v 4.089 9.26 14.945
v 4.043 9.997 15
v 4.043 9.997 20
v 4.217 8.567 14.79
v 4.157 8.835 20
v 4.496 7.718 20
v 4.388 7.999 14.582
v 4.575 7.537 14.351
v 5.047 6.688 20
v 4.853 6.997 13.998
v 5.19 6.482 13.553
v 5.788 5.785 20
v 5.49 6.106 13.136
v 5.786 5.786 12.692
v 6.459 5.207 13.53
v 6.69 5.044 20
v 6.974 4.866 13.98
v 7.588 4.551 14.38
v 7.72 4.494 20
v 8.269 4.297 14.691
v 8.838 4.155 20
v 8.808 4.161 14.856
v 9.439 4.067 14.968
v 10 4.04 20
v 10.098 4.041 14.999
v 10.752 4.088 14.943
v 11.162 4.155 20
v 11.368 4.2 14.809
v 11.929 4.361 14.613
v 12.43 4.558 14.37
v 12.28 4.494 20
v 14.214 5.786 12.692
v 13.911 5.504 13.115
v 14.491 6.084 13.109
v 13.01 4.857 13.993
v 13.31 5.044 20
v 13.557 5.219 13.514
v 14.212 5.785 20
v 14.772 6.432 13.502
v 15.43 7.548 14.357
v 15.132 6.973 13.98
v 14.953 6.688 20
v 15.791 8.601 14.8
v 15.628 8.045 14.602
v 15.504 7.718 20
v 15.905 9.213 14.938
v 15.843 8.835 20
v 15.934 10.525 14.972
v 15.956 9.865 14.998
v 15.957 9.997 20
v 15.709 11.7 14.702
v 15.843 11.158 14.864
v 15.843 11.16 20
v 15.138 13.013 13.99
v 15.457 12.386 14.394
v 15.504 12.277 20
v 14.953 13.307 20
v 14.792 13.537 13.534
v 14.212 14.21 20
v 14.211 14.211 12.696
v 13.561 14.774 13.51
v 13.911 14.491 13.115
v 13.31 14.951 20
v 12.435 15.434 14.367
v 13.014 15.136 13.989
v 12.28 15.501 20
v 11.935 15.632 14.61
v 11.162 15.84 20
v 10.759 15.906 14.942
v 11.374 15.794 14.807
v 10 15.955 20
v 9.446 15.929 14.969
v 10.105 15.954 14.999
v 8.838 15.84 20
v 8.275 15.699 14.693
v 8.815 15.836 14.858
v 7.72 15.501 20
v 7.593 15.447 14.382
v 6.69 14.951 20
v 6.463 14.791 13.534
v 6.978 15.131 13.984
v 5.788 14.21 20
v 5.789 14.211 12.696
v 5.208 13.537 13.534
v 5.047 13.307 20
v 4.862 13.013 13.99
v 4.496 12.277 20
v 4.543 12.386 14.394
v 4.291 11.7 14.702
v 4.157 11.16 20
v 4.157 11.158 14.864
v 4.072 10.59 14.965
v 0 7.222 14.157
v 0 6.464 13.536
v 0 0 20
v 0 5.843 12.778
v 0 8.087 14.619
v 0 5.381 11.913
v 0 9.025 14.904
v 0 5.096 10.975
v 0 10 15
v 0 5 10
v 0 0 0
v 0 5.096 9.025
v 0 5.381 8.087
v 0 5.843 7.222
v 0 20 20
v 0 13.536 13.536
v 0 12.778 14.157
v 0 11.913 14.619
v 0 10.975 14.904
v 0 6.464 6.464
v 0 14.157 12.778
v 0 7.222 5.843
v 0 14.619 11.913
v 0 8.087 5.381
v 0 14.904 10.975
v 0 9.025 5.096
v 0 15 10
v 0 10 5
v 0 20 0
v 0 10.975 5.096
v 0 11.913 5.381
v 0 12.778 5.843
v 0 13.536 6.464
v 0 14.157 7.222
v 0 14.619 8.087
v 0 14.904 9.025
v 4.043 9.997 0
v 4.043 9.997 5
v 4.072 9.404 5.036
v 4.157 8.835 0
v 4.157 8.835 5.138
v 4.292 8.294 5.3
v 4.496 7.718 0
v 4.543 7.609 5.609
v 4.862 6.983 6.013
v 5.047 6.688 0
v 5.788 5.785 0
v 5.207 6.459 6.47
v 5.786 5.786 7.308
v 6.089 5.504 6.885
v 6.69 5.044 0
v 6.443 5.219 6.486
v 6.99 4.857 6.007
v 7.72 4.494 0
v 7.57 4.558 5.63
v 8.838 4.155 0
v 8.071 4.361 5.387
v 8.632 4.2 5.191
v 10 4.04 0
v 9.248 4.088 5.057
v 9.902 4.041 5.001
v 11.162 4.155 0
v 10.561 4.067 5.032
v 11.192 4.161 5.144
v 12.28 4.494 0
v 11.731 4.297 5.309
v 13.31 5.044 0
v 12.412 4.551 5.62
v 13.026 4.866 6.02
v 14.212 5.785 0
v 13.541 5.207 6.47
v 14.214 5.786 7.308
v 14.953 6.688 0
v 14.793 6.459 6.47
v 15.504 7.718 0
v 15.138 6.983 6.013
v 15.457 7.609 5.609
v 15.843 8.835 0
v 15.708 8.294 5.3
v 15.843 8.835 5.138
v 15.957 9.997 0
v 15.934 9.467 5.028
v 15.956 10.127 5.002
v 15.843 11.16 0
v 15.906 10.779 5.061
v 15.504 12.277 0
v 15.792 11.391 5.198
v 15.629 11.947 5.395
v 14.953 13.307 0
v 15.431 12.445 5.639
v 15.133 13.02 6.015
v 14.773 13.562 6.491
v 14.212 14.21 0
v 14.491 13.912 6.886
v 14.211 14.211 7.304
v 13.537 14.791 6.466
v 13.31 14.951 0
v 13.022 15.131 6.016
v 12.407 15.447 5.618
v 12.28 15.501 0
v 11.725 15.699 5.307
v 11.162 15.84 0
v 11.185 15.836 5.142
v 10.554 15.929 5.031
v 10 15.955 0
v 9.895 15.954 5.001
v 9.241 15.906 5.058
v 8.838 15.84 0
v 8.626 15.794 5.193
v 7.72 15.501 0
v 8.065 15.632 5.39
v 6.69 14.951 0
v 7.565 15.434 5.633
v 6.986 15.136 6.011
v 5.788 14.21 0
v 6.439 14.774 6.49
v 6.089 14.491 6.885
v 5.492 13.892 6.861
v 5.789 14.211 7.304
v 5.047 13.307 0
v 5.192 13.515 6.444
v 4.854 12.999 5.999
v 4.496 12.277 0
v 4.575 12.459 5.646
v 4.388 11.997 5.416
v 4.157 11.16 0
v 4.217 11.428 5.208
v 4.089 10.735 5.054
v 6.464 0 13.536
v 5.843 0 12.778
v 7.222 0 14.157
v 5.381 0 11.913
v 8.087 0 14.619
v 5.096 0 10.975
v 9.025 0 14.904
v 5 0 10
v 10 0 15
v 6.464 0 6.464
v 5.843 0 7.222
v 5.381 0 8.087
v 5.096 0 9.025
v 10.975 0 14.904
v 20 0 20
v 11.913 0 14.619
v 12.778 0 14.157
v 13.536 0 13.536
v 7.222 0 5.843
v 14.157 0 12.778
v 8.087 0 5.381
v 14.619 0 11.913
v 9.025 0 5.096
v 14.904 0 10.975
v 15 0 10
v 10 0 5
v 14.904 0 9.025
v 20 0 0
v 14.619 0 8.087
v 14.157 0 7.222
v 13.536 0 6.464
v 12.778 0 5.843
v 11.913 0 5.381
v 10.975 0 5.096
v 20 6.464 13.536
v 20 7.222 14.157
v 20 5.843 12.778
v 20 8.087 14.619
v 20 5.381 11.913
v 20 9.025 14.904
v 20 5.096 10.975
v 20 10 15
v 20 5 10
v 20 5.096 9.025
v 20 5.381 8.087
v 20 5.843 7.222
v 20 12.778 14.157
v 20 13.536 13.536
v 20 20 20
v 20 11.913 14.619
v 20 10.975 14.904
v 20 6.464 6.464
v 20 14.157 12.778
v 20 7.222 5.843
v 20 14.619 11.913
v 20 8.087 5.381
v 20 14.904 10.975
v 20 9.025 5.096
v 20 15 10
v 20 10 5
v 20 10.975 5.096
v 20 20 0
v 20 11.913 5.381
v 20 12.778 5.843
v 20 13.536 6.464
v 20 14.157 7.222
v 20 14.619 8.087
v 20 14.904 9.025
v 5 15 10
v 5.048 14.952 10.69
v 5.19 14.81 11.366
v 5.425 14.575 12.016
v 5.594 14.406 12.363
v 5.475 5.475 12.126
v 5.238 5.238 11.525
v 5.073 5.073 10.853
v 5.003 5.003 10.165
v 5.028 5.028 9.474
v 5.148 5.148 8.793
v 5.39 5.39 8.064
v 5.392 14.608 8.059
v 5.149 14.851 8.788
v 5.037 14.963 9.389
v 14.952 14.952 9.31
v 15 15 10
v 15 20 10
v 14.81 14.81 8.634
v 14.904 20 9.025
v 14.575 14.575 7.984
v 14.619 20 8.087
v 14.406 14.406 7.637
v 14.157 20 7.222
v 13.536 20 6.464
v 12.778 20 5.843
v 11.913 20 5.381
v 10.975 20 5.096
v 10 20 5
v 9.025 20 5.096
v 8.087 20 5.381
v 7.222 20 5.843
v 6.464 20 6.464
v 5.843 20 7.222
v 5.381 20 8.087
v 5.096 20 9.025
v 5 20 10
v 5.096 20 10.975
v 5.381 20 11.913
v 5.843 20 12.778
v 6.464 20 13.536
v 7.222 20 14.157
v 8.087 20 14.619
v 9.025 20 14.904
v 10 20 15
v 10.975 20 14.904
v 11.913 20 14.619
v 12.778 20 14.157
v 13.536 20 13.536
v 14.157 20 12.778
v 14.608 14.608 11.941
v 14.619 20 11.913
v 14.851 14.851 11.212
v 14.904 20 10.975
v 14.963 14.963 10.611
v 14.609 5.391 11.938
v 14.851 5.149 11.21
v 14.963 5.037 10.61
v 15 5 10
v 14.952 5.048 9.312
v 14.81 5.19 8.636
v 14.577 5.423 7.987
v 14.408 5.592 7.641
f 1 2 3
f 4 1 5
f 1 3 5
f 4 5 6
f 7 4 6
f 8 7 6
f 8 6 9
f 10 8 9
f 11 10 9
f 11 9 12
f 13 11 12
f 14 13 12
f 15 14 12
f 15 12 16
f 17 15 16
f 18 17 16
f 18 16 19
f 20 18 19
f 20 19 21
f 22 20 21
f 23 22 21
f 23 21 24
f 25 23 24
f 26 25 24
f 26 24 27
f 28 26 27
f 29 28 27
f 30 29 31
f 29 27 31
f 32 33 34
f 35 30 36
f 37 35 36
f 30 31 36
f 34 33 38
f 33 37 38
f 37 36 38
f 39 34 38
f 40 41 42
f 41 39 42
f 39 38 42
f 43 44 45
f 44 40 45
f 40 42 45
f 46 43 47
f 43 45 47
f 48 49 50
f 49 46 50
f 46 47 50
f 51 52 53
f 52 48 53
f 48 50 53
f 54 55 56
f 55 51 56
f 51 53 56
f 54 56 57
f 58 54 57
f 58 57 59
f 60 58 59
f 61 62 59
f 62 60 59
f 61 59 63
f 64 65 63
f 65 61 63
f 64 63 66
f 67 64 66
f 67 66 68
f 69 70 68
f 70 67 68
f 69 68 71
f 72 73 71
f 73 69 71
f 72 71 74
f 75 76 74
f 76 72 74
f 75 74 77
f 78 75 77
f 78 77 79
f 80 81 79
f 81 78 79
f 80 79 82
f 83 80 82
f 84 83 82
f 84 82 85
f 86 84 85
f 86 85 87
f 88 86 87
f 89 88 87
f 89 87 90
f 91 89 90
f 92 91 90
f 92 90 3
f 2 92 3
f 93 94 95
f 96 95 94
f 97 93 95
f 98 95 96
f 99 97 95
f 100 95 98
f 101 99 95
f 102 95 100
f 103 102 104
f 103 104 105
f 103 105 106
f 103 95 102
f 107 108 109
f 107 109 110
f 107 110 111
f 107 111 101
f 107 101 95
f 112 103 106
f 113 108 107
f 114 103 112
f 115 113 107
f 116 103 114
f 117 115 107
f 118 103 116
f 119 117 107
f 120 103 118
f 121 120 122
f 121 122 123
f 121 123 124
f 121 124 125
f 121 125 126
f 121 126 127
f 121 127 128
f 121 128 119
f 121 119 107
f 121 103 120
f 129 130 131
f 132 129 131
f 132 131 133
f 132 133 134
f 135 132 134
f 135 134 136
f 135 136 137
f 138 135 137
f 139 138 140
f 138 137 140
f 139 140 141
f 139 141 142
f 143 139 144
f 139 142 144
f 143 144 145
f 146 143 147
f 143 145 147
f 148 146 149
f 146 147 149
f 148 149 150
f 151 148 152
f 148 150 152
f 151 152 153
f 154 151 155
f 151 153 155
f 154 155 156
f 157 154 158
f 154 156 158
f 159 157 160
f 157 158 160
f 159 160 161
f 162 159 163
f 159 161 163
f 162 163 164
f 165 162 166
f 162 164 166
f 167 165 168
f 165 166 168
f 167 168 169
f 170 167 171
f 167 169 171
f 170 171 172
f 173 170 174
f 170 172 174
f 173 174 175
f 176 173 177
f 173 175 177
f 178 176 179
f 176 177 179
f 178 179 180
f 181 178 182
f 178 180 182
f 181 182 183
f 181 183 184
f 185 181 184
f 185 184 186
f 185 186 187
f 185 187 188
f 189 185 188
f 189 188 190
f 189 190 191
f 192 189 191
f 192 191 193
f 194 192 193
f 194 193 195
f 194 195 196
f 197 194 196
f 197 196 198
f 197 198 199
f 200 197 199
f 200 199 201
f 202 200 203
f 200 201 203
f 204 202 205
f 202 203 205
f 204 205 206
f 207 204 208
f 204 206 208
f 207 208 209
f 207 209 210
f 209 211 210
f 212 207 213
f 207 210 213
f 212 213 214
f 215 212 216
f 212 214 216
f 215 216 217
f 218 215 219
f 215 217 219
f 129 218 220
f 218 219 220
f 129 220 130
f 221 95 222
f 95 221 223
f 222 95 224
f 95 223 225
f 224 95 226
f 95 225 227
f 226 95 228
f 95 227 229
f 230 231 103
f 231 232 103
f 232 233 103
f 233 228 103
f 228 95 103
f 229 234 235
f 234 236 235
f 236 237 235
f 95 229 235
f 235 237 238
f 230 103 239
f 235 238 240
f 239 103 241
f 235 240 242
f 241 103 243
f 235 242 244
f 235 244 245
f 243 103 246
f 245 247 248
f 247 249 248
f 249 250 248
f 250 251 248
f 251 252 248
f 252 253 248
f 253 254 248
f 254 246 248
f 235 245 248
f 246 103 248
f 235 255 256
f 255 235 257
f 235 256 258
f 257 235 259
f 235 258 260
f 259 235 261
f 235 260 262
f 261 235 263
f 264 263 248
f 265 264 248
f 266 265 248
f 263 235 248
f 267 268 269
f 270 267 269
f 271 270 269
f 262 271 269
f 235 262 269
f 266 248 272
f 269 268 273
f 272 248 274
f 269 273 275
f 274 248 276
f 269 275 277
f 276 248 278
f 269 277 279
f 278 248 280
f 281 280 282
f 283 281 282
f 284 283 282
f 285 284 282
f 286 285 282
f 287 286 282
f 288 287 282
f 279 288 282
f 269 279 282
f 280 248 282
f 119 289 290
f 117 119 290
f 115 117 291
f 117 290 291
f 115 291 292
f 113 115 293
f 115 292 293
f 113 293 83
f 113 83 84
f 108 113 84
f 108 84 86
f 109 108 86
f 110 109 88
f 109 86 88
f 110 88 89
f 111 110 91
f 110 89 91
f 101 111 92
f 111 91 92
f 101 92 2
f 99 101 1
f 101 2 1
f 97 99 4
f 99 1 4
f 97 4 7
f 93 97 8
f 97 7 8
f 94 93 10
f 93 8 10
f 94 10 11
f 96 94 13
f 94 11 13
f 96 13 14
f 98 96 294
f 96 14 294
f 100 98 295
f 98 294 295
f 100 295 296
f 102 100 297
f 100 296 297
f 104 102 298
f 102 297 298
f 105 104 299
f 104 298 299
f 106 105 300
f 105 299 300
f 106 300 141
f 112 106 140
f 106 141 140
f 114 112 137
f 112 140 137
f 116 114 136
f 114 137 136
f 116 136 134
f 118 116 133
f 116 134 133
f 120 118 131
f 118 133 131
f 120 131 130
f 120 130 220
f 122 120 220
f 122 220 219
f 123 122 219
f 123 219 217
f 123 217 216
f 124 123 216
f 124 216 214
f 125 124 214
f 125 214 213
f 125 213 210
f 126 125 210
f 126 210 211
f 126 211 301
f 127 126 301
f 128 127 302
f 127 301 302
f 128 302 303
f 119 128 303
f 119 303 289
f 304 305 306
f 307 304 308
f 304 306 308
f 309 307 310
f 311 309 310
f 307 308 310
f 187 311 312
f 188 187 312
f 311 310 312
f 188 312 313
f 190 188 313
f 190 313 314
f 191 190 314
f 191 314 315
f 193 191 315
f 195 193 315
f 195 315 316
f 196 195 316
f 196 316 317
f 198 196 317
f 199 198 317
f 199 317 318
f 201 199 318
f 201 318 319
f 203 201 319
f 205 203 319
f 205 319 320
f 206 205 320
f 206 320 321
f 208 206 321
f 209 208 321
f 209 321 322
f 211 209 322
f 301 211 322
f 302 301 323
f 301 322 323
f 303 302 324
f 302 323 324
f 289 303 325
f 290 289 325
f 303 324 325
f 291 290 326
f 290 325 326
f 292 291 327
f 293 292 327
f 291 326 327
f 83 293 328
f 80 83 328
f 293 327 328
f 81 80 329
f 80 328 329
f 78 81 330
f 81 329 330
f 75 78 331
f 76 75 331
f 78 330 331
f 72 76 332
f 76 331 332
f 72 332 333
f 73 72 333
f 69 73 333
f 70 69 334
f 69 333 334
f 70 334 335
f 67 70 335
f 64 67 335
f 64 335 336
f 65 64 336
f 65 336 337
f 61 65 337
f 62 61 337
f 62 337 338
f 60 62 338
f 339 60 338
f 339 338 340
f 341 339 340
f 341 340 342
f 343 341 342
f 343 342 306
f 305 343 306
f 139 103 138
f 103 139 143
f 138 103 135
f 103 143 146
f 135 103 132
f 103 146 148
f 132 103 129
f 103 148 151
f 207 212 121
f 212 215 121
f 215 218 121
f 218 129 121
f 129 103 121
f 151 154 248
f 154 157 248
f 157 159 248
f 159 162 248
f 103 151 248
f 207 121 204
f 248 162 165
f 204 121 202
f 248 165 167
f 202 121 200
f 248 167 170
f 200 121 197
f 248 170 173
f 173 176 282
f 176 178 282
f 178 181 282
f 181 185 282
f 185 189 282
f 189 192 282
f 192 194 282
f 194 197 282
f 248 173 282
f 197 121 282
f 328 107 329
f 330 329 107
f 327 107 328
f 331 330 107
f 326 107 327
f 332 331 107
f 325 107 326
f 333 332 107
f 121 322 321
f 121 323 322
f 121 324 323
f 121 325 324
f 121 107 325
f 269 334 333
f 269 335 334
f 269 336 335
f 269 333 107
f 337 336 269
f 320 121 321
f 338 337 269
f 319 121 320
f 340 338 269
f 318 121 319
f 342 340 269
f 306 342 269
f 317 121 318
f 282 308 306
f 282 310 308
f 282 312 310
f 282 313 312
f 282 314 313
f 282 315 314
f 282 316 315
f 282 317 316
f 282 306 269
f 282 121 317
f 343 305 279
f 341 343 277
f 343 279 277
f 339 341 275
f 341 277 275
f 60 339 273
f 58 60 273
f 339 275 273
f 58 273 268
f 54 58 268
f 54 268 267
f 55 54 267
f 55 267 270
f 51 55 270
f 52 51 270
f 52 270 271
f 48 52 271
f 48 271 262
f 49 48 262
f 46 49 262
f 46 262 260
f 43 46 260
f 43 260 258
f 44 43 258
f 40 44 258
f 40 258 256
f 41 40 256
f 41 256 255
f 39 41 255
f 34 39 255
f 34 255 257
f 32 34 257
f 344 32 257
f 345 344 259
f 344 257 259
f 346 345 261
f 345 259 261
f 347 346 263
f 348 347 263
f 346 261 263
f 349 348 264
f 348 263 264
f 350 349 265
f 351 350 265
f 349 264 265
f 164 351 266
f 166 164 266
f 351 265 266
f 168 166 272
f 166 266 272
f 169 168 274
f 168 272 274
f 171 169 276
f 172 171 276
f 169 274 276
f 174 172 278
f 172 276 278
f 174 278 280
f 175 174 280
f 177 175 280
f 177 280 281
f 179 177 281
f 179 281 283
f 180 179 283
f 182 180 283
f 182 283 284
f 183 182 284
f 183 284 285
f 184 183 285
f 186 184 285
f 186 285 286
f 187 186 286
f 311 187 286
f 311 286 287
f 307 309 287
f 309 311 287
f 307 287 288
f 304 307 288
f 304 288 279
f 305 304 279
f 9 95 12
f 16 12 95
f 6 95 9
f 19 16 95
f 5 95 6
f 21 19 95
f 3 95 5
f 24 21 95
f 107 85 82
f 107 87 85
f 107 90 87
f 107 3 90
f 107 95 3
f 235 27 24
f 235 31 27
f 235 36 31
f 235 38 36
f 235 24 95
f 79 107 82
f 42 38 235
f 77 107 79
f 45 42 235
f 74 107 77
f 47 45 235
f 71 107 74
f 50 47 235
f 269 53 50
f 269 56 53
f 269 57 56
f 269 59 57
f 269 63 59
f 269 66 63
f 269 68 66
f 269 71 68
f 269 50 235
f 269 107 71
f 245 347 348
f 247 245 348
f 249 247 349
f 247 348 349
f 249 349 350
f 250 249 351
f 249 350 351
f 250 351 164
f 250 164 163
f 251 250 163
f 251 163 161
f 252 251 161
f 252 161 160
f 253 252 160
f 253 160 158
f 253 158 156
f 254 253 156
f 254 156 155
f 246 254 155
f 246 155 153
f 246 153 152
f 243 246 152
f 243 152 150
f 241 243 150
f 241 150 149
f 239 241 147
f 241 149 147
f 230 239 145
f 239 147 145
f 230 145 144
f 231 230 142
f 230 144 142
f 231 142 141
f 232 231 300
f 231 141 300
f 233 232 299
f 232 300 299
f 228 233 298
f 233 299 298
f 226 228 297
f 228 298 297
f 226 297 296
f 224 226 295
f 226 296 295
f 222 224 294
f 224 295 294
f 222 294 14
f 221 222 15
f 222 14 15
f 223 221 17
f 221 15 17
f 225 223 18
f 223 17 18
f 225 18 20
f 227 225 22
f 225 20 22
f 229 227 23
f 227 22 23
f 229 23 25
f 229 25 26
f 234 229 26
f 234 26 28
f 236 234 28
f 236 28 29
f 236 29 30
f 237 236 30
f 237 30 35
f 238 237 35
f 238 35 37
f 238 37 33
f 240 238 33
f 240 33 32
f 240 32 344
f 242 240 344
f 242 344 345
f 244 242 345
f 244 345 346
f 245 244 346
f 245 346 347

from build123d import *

# Parameters (mm, degrees)
F0_W     = 20
F0_H     = 20
F1_DEPTH = 20
F3_DEPTH = 20
F5_DEPTH = 20
F6_R     = 5
F7_DEPTH = 20


with BuildPart() as f1:
    # F0 (on Top) → F1 (new body)
    with BuildSketch(Plane.XY):
        with Locations((10, 10)):
            Rectangle(F0_W, F0_H)
    extrude(amount=F1_DEPTH)

    # F2 (on face) → F3 (cut)
    with BuildSketch(Plane.XY.offset(20)):
        with BuildLine():
            Line((4.0428322988, 9.9974628538), (15.9571677012, 9.9974628538))
            ThreePointArc((15.9571677012, 9.9974628538), (10, 15.954630555), (4.0428322988, 9.9974628538))
        make_face()
        with BuildLine():
            ThreePointArc((4.0428322988, 9.9974628538), (10, 4.0402951526), (15.9571677012, 9.9974628538))
            Line((15.9571677012, 9.9974628538), (4.0428322988, 9.9974628538))
        make_face()
    extrude(amount=-F3_DEPTH, mode=Mode.SUBTRACT)

    # F4 (on face) → F5 (cut)
    with BuildSketch(Plane(origin=(0, 20, 0), x_dir=(-1, 0, 0), z_dir=(0, 1, 0))):
        with BuildLine():
            Line((-15, 10), (-5, 10))
            ThreePointArc((-5, 10), (-10, 15), (-15, 10))
        make_face()
        with BuildLine():
            ThreePointArc((-15, 10), (-10, 5), (-5, 10))
            Line((-5, 10), (-15, 10))
        make_face()
    extrude(amount=-F5_DEPTH, mode=Mode.SUBTRACT)

    # F6 (on face) → F7 (cut)
    with BuildSketch(Plane.YZ.offset(20)):
        with Locations((10, 10)):
            Circle(F6_R)
    extrude(amount=-F7_DEPTH, mode=Mode.SUBTRACT)


solid = f1.part
